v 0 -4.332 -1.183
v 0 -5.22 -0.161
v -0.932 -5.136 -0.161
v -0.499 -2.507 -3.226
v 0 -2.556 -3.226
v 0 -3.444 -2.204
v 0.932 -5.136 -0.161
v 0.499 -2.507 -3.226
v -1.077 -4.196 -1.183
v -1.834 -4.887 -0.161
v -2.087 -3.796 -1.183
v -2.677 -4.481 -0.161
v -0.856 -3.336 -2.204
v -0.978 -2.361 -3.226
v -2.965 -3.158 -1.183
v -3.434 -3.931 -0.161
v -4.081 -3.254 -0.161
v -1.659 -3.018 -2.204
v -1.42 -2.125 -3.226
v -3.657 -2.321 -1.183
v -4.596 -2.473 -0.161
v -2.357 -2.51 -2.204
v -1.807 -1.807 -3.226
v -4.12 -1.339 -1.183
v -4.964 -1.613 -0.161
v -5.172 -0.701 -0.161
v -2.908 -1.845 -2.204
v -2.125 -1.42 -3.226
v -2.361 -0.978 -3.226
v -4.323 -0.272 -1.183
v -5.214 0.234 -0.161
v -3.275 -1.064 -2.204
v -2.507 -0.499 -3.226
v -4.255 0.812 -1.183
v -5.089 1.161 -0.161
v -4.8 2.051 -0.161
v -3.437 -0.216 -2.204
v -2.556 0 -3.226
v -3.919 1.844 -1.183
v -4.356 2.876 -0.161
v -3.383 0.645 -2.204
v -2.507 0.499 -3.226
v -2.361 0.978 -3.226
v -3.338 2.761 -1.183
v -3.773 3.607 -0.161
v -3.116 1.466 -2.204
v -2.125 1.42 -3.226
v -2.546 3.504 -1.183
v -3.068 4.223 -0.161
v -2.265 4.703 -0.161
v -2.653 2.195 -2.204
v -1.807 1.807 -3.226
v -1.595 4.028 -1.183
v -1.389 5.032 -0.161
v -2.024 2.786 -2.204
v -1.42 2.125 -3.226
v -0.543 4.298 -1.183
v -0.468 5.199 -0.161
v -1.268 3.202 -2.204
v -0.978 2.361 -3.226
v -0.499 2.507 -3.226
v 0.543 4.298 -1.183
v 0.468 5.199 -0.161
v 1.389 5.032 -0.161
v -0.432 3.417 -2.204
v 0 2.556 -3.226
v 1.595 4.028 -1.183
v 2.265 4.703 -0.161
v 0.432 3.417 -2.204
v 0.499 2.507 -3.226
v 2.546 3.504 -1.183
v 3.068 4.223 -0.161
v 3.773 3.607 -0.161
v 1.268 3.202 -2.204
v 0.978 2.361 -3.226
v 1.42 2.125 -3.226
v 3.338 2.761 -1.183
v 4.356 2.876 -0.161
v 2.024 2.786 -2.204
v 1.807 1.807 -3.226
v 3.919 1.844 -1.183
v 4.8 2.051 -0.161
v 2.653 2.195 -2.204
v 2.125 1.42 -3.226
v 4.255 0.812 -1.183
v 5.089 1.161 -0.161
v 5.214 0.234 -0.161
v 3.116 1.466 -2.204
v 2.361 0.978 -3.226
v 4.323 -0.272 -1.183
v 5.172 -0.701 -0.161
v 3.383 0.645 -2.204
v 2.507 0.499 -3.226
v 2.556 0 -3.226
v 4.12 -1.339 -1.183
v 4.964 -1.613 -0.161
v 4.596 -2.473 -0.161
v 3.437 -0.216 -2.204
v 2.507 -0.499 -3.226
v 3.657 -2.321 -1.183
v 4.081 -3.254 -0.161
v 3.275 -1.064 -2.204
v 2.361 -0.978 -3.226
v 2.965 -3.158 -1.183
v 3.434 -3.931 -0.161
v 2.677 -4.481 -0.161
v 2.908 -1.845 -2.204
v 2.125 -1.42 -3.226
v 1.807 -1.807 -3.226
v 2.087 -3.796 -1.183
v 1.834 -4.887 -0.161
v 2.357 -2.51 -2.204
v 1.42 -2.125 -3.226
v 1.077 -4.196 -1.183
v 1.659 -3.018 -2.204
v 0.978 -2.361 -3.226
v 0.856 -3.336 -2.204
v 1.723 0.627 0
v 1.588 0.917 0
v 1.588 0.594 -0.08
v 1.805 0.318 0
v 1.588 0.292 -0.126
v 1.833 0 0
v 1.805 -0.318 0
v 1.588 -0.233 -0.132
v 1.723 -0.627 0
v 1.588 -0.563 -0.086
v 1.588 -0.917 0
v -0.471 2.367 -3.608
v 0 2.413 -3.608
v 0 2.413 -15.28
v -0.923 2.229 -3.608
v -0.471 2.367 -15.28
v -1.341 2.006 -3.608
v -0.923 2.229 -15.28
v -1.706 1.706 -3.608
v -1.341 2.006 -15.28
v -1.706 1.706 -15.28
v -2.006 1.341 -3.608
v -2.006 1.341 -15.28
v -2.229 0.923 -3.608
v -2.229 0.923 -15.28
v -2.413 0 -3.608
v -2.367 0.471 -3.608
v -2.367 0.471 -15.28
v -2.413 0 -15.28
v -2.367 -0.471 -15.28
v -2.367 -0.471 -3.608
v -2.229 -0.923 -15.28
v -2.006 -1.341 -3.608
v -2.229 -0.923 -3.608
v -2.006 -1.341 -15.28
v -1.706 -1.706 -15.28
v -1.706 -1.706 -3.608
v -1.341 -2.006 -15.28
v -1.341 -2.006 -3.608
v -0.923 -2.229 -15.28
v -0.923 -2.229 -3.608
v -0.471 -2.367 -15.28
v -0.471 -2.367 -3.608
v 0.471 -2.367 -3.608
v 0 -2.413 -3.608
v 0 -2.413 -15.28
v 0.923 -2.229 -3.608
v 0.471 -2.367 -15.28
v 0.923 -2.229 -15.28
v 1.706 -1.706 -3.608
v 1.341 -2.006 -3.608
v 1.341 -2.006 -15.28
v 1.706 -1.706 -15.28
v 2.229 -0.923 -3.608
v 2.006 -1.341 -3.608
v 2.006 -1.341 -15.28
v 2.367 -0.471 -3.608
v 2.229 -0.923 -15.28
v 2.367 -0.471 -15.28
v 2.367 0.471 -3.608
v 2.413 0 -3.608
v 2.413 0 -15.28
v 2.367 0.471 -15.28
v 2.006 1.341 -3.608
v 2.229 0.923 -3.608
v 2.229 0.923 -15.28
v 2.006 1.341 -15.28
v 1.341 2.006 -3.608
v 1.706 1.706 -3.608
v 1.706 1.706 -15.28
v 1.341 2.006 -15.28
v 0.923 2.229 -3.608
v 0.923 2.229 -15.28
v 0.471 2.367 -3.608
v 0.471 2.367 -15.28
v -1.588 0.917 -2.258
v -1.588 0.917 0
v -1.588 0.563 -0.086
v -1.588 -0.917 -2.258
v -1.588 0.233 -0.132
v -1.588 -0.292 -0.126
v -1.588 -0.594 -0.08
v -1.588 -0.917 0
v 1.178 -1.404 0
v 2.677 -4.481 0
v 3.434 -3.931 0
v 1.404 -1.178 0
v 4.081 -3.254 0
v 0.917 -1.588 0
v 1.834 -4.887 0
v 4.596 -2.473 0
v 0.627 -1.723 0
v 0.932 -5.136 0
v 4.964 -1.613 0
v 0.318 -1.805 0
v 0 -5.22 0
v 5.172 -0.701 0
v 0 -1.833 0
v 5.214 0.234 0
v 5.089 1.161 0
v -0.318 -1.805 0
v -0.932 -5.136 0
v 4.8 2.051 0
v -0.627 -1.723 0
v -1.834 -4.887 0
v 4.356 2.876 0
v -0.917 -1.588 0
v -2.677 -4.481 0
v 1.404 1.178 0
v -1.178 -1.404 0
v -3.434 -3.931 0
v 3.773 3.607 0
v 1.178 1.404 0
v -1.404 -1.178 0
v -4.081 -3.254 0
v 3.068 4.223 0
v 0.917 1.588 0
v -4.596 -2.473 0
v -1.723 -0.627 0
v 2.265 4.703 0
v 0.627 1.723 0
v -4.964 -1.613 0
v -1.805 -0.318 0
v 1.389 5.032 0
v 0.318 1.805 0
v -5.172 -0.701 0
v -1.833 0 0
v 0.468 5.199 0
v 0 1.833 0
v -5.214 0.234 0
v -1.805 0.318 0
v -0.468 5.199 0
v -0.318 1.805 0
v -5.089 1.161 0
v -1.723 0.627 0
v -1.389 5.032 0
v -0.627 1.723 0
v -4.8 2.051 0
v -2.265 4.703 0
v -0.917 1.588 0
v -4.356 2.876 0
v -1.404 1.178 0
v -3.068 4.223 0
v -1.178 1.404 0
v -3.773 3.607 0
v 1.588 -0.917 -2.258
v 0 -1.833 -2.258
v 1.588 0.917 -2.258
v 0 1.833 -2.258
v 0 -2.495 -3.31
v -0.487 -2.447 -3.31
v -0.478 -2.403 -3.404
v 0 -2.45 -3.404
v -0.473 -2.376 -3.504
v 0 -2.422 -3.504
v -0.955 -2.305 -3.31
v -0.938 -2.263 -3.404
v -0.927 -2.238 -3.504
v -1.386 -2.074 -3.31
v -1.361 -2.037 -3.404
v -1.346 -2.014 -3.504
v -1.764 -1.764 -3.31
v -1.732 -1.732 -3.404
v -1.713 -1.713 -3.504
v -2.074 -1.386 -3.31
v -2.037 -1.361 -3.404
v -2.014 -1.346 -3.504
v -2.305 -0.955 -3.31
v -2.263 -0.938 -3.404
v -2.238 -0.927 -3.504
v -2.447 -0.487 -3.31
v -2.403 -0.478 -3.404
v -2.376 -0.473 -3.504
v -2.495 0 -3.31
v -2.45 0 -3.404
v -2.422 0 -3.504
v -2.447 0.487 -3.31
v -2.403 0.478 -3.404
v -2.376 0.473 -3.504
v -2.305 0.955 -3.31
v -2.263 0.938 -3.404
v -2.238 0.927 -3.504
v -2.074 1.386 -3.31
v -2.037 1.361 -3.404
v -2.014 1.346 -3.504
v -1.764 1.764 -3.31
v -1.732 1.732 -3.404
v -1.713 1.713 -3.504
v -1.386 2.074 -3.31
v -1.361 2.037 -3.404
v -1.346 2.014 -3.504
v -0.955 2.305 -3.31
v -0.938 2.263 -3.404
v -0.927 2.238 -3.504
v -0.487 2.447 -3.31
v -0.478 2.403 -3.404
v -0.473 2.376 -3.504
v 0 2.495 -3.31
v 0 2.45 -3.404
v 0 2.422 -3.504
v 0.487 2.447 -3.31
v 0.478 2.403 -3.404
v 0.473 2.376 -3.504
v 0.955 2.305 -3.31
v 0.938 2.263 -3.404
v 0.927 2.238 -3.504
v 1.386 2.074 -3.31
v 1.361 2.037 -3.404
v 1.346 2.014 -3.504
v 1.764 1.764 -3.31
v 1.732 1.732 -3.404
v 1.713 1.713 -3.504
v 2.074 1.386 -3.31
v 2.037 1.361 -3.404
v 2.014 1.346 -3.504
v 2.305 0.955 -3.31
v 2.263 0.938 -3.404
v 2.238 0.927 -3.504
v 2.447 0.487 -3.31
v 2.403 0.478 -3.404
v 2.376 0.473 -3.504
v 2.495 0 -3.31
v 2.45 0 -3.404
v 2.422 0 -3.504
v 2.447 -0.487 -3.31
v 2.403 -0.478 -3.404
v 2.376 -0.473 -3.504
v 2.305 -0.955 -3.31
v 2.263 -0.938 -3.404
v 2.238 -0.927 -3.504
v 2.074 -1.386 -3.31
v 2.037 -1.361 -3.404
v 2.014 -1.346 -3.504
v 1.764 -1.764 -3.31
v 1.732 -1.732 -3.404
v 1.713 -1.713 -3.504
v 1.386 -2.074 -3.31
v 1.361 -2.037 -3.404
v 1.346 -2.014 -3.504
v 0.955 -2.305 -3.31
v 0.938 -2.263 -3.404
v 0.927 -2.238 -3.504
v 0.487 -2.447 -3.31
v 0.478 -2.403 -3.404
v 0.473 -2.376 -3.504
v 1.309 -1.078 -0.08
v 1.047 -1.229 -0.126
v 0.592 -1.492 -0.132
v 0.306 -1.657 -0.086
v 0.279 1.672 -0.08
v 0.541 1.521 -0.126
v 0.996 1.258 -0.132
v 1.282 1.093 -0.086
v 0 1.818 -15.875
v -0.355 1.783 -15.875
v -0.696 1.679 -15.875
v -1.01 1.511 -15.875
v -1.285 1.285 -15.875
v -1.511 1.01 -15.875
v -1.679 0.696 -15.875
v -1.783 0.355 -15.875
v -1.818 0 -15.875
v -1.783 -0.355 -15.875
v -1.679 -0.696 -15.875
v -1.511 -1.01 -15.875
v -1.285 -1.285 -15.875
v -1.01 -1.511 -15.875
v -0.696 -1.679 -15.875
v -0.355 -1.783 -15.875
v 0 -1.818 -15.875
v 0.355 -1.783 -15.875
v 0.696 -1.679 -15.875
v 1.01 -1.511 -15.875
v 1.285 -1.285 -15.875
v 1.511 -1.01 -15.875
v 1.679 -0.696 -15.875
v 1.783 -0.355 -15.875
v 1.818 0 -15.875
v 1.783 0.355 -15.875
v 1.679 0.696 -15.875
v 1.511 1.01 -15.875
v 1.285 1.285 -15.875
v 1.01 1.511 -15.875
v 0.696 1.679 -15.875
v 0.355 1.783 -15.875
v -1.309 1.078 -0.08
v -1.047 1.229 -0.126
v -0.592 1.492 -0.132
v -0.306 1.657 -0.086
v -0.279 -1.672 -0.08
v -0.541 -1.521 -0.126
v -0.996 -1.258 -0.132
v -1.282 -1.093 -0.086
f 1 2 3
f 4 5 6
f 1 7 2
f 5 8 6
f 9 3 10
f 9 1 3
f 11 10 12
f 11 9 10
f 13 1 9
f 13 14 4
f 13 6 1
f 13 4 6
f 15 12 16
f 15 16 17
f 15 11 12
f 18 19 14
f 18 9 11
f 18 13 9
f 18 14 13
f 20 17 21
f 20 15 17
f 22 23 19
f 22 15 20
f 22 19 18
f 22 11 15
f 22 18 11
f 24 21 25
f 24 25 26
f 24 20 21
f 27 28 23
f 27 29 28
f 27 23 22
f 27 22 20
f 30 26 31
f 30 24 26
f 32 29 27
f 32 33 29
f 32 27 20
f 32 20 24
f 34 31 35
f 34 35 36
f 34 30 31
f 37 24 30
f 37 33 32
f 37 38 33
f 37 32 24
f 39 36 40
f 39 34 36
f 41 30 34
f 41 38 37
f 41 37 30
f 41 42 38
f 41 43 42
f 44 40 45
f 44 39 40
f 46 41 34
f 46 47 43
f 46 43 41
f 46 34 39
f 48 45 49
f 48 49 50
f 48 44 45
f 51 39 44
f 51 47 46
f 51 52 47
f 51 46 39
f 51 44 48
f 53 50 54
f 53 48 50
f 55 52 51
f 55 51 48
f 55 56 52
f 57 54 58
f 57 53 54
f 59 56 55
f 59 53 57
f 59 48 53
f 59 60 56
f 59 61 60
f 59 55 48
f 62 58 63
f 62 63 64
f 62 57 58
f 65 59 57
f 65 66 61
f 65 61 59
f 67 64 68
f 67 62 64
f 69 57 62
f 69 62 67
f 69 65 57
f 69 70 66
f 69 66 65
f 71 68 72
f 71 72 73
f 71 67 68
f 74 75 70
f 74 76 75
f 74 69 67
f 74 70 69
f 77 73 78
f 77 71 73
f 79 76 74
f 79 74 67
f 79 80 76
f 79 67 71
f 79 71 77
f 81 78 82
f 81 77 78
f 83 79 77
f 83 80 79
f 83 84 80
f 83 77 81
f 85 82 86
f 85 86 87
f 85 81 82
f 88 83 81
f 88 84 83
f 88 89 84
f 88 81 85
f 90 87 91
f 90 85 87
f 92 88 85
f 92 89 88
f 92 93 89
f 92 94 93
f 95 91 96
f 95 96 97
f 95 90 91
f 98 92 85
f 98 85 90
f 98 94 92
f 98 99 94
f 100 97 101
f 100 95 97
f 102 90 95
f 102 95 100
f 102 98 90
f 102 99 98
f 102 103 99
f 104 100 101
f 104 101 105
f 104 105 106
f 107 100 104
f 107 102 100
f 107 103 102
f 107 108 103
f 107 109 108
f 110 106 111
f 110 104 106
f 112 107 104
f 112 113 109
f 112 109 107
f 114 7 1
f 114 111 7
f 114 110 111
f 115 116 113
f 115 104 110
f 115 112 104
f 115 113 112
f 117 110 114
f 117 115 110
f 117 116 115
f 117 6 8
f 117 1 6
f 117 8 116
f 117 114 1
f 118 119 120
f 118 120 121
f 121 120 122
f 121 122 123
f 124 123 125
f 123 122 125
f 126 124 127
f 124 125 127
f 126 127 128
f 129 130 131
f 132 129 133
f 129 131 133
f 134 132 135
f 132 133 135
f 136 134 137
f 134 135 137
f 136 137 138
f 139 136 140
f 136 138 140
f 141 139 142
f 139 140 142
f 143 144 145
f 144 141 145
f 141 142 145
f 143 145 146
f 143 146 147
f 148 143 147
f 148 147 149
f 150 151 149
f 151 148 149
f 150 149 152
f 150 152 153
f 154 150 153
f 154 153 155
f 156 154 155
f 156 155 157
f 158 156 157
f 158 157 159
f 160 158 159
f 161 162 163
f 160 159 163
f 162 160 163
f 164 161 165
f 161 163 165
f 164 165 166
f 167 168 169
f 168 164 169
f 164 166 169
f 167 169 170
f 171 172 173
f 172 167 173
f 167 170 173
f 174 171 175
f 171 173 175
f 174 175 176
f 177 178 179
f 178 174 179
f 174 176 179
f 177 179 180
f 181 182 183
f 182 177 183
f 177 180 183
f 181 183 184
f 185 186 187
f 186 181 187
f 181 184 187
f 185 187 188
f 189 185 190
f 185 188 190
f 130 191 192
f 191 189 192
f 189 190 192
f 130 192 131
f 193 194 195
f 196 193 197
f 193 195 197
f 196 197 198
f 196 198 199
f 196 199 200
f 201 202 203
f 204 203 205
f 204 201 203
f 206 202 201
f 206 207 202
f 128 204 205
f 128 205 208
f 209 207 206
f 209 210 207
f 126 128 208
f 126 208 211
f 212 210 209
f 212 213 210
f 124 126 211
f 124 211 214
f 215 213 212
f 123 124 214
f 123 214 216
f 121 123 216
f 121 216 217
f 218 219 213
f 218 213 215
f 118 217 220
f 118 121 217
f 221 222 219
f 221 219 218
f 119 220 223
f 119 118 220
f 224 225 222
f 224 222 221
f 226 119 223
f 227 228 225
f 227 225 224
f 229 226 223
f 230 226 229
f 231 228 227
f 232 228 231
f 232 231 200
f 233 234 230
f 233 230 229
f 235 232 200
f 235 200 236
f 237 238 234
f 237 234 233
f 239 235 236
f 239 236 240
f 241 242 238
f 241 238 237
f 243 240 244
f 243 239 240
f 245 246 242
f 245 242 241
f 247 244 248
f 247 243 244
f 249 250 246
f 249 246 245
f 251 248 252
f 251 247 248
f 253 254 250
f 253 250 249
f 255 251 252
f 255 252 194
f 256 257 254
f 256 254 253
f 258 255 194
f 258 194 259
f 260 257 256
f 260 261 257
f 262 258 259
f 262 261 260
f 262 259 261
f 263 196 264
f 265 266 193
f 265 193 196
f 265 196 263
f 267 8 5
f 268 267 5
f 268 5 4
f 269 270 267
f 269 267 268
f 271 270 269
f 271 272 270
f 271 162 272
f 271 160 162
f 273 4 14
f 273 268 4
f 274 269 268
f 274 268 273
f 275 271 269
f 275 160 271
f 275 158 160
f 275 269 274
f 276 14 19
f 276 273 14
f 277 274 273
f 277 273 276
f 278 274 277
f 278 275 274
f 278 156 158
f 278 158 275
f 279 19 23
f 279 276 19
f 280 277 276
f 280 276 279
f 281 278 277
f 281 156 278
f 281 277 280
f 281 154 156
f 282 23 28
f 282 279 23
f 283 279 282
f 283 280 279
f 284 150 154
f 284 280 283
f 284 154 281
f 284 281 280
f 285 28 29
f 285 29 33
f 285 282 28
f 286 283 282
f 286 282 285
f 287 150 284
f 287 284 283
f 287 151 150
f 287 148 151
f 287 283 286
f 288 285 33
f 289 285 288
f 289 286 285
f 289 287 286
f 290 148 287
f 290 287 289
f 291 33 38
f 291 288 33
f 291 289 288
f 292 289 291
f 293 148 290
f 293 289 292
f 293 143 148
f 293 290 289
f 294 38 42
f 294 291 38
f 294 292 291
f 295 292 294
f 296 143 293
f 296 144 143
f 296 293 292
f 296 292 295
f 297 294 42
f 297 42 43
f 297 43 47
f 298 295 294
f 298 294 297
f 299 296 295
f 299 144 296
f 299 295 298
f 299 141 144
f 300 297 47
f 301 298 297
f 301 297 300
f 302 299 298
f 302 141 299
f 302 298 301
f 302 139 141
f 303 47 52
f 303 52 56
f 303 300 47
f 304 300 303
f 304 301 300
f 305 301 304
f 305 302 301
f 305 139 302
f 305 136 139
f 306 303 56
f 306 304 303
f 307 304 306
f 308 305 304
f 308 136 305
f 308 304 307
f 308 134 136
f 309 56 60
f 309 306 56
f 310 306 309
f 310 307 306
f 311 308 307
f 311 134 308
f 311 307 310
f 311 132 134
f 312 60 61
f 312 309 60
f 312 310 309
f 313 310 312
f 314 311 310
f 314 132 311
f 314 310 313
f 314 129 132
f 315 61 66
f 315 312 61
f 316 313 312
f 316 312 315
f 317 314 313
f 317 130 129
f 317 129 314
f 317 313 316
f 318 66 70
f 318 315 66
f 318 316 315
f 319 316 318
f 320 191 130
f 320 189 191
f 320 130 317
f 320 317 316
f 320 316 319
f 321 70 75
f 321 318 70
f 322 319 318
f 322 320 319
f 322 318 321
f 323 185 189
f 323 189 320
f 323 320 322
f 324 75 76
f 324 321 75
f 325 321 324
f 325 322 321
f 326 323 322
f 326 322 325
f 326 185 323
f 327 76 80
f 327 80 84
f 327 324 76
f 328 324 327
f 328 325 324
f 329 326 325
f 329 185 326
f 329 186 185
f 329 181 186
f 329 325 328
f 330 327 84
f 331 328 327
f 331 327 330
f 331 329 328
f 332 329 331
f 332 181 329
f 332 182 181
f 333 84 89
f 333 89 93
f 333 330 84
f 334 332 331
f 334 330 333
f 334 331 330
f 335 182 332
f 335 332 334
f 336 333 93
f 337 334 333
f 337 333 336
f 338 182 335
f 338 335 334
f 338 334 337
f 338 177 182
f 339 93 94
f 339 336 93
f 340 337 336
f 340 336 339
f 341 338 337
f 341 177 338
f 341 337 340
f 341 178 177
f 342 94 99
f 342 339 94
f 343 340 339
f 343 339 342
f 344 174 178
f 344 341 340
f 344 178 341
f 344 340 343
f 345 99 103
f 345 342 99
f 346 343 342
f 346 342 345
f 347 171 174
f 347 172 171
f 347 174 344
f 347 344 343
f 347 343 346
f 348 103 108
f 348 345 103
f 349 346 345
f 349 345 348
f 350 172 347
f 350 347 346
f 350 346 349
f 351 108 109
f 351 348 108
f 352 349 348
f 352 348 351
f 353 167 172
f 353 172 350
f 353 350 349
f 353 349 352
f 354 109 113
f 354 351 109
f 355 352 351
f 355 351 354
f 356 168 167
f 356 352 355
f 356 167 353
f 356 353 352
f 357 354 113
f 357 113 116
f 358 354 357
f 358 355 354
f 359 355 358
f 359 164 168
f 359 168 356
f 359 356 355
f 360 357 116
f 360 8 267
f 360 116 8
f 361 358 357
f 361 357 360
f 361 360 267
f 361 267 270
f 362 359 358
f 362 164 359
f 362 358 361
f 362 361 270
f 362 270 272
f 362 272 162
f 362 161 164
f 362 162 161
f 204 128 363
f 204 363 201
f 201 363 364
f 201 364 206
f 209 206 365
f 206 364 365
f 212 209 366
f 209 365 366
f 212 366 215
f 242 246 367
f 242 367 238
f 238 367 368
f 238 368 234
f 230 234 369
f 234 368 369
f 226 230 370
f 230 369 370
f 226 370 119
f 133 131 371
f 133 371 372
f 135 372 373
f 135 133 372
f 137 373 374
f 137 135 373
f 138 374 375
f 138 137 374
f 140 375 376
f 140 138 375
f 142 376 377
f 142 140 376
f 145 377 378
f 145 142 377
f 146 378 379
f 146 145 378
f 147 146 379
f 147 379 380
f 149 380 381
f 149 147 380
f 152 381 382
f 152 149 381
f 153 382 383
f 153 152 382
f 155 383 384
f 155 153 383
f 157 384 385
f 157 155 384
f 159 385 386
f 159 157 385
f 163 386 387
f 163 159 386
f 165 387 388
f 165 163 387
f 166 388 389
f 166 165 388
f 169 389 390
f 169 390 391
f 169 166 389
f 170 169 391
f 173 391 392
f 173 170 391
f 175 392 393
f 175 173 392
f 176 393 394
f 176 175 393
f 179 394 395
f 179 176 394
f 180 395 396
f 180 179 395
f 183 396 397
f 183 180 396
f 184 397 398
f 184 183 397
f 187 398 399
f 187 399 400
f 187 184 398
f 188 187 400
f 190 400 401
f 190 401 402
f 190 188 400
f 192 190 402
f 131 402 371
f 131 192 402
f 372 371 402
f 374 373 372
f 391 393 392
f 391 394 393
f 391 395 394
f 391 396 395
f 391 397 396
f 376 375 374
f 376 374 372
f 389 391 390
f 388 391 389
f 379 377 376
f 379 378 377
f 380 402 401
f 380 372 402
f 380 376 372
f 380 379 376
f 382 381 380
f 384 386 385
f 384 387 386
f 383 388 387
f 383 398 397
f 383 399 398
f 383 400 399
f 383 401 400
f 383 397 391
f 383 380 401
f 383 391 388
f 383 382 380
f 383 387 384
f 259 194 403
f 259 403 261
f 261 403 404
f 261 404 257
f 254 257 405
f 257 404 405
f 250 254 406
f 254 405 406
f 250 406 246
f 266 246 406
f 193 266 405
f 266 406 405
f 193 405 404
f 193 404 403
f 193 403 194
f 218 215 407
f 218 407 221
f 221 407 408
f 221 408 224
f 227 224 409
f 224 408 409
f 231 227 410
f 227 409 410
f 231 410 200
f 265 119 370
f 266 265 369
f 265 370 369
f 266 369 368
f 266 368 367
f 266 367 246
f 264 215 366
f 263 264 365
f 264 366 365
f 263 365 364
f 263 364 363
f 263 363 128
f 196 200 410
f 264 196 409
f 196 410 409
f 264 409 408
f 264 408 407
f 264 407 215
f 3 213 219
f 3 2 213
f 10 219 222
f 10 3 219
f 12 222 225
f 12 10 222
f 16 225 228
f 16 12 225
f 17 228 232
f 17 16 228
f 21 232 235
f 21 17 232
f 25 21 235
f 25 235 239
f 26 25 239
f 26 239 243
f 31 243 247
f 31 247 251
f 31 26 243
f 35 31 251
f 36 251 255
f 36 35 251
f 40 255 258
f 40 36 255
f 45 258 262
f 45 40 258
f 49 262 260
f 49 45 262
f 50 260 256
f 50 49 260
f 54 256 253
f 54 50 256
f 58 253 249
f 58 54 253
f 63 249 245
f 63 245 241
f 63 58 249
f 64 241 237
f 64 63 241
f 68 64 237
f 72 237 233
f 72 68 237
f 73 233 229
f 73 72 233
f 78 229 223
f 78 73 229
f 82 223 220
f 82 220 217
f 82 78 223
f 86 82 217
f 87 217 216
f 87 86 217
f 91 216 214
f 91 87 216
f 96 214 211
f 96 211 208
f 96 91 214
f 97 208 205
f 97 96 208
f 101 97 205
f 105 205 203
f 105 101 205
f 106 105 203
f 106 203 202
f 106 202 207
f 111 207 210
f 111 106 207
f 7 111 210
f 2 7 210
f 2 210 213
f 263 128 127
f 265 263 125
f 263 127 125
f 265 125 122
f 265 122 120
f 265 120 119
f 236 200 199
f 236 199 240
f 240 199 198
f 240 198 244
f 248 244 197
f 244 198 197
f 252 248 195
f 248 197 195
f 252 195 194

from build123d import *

# Parameters (mm, degrees)
SKETCH1_W          = 15.875
SKETCH1_H          = 2.413
CHAMFER1_SIZE      = 0.5953125
CUT_EXTRUDE2_DEPTH = 2.25806


with BuildPart() as part:
    # Sketch1 → Revolve1 (revolve)
    with BuildSketch(Plane(origin=(0, 0, 0), x_dir=(0, 0, -1), z_dir=(1, 0, 0))):
        with Locations((7.9375, 1.2065)):
            Rectangle(SKETCH1_W, SKETCH1_H)
    revolve(axis=Axis((0, 0, -15.875), (0, 0, 1)))

    # Chamfer1
    chamfer1_edges = [part.edges().sort_by_distance(p)[0] for p in [
        (0, -2.413, -15.875),
    ]]
    chamfer(chamfer1_edges, length=CHAMFER1_SIZE)

    # Sketch7 → Revolve2 (revolve)
    with BuildSketch(Plane(origin=(0, 0, 0), x_dir=(0, 0, -1), z_dir=(1, 0, 0)), mode=Mode.PRIVATE) as revolve2_sk:
        with BuildLine():
            Line((0, 5.2197), (0.16129, 5.2197))
            Line((0.16129, 5.2197), (3.2258, 2.555762099))
            ThreePointArc((3.2258, 2.555762099), (3.403809493, 2.44985758), (3.607634579, 2.413))
            Line((3.607634579, 2.413), (3.607634579, 0))
            Line((3.607634579, 0), (0, 0))
            Line((0, 0), (0, 5.2197))
        make_face()
    revolve(revolve2_sk.sketch.rotate(Axis((0, 0, 0), (0, 0, -1)), 180), axis=Axis((0, 0, 0), (0, 0, -1)))

    # Sketch5 → Cut-Extrude2 (cut)
    with BuildSketch(Plane.XY):
        Polygon((0, 1.833087105), (-1.5875, 0.916543552), (-1.5875, -0.916543552), (0, -1.833087105), (1.5875, -0.916543552), (1.5875, 0.916543552), align=None)
    extrude(amount=-CUT_EXTRUDE2_DEPTH, mode=Mode.SUBTRACT)

    # Cut-Extrude3 cone 1 section (through the dimple's axis) → Cut-Extrude3 (revolve, cut)
    with BuildSketch(Plane(origin=(0, 0, 0), x_dir=(0, -1, 0), z_dir=(1, 0, 0))):
        Polygon((0, 0), (1.833087105, 0), (0, 1.058333333), align=None)
    revolve(axis=Axis((0, 0, 0), (0, 0, -1)), mode=Mode.SUBTRACT)


solid = part.part
